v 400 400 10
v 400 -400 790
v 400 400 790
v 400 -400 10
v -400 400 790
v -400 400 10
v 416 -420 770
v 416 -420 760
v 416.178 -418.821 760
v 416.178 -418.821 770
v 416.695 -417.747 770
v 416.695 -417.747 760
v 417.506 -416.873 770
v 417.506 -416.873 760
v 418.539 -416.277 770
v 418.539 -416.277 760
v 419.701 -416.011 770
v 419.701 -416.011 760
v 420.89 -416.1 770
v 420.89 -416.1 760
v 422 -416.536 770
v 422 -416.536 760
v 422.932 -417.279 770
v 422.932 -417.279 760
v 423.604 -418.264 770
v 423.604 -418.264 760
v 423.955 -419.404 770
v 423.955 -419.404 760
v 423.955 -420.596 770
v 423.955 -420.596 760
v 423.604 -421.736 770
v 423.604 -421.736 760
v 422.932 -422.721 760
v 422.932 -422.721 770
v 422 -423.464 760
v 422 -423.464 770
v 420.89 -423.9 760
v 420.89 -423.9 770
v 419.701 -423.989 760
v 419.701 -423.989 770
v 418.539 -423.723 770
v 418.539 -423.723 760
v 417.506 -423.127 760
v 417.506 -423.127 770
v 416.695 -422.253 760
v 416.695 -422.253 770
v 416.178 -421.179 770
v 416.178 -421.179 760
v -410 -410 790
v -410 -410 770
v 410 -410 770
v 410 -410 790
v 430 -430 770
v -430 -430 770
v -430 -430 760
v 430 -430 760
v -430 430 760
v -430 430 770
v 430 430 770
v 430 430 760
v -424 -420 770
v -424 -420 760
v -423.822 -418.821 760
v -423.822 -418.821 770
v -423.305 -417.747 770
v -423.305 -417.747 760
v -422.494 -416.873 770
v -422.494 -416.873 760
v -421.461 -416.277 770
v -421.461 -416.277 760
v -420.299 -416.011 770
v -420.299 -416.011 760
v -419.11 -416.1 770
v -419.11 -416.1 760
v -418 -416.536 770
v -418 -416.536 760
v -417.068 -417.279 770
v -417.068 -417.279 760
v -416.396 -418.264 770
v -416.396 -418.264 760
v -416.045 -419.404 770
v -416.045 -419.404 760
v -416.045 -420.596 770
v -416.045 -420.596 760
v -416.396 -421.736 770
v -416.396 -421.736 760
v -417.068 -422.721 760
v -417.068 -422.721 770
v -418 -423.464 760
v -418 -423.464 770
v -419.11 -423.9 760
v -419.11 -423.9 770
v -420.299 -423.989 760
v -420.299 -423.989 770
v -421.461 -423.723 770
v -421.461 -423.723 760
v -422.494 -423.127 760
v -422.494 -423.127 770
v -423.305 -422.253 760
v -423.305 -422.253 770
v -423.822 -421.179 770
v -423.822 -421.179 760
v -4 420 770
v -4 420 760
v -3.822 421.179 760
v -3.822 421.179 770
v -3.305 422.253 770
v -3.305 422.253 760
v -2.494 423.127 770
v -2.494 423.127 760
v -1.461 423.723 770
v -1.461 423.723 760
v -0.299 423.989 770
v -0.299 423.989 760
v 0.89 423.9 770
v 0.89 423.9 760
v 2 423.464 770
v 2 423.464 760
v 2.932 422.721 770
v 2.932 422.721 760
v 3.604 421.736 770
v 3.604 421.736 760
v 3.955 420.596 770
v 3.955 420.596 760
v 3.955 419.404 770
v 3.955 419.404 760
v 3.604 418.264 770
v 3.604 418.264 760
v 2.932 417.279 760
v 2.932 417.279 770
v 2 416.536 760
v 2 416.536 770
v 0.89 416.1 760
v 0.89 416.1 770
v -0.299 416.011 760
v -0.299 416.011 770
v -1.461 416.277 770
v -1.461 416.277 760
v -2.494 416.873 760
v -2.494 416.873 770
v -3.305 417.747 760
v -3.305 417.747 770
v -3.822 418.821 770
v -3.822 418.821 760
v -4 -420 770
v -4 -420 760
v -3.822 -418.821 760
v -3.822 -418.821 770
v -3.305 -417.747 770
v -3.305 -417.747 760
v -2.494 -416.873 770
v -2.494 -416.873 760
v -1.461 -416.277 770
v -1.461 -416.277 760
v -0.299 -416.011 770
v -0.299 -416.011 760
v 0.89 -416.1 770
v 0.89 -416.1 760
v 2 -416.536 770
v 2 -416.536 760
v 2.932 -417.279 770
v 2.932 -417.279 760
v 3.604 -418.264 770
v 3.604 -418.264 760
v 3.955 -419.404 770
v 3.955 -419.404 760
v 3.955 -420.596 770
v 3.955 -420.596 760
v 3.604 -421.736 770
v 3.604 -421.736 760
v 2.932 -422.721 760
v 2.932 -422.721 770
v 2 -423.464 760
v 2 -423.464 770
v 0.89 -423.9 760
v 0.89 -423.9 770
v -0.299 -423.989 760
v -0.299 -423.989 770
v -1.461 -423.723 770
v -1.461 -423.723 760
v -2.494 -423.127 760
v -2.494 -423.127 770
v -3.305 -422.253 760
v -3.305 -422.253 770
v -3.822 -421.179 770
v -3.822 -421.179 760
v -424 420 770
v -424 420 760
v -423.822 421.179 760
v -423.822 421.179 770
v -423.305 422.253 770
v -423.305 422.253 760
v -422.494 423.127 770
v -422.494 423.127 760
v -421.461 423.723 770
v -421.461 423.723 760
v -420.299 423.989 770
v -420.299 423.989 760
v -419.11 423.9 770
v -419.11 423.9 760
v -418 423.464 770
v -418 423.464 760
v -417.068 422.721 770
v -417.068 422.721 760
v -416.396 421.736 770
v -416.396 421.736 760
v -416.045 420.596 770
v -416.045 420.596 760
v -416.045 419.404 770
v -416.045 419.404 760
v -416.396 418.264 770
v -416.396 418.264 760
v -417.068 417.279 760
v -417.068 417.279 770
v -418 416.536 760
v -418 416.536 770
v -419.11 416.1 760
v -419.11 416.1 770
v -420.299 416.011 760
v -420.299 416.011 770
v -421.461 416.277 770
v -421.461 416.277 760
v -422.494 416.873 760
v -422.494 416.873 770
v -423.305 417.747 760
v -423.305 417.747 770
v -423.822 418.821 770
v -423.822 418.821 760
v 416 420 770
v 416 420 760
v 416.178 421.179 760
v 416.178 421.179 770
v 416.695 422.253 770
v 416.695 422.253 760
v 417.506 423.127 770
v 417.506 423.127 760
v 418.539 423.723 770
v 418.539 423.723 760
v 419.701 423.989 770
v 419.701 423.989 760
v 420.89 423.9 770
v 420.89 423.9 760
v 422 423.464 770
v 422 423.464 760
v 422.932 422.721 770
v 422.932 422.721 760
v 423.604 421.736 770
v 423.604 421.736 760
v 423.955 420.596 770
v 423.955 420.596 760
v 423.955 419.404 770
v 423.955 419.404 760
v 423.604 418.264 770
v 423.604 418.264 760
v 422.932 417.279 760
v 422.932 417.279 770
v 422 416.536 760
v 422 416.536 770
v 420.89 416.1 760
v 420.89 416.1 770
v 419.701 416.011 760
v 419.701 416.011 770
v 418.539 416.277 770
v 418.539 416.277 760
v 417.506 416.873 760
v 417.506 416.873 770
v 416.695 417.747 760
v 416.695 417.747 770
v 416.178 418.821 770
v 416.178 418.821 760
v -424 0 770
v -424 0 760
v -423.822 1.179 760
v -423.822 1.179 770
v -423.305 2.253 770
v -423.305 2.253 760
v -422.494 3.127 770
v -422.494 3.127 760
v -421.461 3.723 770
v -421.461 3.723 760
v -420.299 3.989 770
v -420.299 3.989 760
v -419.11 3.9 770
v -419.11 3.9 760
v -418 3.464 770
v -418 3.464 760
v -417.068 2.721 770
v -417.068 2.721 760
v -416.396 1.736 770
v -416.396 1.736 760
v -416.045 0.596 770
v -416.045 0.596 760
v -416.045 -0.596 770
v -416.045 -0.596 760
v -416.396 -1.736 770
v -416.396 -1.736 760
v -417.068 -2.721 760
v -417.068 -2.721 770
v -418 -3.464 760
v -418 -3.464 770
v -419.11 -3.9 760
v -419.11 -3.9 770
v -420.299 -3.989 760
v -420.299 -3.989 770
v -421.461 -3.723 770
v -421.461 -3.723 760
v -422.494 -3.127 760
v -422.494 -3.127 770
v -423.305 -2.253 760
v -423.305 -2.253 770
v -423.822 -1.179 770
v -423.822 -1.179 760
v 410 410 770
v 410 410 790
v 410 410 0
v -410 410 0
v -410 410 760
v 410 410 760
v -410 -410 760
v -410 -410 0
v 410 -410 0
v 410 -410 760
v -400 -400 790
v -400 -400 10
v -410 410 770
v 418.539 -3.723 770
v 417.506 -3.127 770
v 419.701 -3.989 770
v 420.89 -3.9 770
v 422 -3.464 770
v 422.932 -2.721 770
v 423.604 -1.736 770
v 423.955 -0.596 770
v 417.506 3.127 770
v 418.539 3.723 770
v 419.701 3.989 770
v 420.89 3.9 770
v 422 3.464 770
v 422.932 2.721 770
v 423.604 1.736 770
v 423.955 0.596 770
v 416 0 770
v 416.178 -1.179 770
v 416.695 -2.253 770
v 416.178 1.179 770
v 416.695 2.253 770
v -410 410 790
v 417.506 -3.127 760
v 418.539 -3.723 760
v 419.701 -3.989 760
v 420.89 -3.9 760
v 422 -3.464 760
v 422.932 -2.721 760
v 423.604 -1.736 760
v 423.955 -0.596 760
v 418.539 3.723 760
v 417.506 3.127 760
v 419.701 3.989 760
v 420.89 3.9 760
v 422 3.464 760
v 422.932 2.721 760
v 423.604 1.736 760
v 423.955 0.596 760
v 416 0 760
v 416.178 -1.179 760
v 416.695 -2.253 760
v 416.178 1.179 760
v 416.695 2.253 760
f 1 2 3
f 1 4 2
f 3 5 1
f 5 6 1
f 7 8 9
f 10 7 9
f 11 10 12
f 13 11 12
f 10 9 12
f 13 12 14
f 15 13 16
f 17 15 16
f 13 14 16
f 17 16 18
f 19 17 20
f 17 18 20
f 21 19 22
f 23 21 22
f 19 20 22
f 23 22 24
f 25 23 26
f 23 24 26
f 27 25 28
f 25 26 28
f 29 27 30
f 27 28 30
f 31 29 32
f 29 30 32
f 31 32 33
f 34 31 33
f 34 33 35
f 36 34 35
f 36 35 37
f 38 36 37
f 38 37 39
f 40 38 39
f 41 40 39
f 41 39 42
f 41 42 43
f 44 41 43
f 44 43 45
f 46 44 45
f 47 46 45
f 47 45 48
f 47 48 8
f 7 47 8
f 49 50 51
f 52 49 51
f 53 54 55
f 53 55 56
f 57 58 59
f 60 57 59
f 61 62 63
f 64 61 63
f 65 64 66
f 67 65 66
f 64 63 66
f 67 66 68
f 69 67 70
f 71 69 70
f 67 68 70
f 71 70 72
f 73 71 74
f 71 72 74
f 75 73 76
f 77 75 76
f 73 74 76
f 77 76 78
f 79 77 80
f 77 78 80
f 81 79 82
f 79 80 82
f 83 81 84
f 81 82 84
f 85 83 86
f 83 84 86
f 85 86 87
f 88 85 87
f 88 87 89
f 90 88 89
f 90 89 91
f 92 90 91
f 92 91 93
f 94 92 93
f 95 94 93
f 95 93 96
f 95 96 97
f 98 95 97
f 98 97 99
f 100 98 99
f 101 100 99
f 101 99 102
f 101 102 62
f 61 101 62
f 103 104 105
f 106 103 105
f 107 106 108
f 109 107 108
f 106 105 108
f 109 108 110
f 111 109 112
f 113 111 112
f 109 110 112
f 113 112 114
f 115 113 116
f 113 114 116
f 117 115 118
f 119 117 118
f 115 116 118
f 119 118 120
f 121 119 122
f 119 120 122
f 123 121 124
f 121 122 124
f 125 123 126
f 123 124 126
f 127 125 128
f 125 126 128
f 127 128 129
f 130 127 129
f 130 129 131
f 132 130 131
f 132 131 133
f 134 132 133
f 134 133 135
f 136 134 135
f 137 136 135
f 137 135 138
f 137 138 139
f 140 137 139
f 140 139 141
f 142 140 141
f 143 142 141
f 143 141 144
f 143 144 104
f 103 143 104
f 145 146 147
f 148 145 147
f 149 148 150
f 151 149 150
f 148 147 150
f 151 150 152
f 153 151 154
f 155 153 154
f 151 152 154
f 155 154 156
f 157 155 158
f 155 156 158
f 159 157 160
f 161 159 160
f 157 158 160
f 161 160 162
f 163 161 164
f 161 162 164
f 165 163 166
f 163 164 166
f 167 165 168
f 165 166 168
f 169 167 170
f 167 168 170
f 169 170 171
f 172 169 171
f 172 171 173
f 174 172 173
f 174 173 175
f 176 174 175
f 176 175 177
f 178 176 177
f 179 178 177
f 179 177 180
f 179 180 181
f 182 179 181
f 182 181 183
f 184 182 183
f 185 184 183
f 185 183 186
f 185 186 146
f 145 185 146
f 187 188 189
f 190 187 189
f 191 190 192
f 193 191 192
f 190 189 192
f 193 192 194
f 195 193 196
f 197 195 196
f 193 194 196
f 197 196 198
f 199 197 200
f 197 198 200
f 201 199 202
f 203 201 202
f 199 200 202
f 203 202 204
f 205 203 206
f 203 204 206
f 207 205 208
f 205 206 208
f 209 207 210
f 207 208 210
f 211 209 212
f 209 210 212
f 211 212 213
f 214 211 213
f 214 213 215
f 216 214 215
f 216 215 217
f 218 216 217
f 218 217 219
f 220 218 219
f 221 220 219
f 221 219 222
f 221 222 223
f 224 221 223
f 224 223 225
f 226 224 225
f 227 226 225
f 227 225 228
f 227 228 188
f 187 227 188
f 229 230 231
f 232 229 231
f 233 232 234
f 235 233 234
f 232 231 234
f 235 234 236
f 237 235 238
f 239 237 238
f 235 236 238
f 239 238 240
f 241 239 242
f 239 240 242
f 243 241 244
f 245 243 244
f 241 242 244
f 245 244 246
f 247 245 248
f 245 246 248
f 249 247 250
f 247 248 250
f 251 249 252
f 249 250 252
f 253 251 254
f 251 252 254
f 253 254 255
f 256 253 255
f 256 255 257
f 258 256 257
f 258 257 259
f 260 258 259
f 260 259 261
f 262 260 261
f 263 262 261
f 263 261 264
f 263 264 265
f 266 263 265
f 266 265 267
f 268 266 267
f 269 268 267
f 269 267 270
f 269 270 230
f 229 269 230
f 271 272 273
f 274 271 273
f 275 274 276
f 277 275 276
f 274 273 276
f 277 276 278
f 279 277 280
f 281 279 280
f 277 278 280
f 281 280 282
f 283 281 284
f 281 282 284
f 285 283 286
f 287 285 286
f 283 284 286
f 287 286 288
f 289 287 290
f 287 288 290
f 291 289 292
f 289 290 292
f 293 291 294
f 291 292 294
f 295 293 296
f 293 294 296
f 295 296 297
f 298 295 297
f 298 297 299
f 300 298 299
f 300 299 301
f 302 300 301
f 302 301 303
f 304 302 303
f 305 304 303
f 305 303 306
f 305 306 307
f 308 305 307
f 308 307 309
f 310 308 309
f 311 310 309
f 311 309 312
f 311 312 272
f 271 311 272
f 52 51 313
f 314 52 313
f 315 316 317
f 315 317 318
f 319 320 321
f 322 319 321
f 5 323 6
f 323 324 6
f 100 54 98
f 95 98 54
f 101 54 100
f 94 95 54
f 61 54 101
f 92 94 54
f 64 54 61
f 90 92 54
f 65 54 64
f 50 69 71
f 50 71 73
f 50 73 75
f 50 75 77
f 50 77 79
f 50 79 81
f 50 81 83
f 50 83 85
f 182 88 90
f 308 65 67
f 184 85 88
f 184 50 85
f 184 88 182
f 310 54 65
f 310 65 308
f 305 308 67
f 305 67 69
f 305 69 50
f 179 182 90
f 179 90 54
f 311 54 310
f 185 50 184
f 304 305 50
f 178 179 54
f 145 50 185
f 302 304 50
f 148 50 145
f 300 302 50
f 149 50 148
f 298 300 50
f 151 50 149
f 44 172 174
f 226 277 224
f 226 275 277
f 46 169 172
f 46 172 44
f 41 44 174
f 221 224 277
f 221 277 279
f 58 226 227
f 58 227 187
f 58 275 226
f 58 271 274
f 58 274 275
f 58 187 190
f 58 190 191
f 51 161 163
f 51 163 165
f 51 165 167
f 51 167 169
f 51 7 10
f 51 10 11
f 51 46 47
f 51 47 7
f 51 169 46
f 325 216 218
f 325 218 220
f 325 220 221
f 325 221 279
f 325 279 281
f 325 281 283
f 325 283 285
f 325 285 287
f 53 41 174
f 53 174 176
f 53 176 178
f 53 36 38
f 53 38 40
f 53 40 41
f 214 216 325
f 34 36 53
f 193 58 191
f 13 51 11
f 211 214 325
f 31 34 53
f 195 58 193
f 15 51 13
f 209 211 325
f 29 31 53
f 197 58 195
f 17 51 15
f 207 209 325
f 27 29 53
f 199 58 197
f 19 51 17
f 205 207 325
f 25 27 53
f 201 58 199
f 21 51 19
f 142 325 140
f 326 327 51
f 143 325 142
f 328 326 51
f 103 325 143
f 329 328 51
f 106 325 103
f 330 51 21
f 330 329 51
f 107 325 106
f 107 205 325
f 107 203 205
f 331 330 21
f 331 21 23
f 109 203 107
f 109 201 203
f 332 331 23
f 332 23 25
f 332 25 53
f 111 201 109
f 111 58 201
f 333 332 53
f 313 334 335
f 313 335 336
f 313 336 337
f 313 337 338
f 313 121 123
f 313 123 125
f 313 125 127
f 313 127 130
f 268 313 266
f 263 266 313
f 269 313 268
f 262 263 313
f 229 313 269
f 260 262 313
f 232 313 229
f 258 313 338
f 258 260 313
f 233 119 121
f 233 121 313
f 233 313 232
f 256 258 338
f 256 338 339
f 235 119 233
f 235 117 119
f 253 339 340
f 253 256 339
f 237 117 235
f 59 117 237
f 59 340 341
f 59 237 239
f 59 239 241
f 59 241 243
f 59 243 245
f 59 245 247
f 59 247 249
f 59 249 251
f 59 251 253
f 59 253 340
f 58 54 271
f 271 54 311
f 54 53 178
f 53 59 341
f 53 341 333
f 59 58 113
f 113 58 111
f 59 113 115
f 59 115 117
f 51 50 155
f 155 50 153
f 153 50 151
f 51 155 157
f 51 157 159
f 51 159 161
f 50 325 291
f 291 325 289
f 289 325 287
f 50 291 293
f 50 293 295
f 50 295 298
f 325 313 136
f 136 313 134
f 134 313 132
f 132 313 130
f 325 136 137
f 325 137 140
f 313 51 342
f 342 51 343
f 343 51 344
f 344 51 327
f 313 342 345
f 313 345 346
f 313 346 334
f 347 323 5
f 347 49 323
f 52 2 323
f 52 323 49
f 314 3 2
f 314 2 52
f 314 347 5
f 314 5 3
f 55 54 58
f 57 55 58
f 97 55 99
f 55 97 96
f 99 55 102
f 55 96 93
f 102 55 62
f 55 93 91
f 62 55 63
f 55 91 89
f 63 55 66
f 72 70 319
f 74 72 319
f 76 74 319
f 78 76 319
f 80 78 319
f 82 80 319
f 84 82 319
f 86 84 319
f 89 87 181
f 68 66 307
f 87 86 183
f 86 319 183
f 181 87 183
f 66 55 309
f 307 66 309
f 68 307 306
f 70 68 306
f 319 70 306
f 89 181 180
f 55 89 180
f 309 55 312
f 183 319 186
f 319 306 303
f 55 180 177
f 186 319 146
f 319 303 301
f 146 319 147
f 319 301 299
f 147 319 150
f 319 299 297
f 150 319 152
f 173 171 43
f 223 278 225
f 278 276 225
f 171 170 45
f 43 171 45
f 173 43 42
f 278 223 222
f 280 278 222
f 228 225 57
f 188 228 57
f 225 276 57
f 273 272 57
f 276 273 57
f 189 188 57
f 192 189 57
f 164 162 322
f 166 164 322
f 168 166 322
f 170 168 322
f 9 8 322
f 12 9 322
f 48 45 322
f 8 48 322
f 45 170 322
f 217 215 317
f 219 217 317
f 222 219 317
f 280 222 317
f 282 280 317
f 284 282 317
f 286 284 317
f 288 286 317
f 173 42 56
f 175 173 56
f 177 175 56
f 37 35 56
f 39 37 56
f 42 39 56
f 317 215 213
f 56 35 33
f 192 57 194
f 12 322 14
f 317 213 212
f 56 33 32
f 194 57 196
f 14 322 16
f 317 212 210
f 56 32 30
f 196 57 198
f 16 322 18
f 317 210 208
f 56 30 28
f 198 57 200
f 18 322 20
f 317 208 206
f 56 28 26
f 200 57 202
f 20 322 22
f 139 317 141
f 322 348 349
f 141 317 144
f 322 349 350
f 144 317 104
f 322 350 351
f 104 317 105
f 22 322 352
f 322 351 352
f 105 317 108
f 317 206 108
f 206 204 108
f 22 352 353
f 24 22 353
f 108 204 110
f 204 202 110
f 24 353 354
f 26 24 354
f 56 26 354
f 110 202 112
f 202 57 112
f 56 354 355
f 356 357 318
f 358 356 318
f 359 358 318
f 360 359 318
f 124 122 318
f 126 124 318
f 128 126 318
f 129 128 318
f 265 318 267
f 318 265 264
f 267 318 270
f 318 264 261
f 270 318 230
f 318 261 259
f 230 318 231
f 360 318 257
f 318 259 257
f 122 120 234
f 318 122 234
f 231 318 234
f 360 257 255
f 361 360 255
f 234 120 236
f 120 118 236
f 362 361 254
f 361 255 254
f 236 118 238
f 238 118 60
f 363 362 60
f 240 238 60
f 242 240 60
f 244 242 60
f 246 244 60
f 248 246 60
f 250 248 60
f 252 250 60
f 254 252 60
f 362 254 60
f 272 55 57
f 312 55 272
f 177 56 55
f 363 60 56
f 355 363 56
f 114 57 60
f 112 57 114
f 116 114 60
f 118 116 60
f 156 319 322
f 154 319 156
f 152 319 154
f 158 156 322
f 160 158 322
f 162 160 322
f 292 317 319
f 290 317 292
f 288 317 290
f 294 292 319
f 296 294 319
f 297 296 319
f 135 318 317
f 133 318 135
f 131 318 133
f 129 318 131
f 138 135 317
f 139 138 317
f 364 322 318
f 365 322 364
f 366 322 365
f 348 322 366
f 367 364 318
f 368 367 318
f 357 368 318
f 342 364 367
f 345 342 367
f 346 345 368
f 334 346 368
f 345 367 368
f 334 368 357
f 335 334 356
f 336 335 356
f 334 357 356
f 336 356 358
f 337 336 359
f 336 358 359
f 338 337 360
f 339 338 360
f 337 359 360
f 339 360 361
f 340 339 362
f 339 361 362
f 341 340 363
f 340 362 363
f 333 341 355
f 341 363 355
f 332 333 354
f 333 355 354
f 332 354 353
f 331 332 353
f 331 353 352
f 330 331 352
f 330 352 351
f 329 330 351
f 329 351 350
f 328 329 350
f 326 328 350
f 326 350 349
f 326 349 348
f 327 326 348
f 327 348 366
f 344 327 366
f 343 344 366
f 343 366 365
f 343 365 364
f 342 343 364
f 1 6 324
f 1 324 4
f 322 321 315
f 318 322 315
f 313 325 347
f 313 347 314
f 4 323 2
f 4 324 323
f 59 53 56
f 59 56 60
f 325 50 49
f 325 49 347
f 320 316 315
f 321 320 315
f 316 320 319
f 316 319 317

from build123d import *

# Parameters (mm, degrees)
F0_W     = 820
F0_H     = 820
F1_DEPTH = 790
F2_T     = -10
F4_W     = 860
F4_H     = 860
F4_W_2   = 820
F4_H_2   = 820
F5_DEPTH = 10
F7_D     = 8


with BuildPart() as f1:
    # F0 (on Top) → F1 (new body)
    with BuildSketch(Plane.XY):
        Rectangle(F0_W, F0_H)
    extrude(amount=F1_DEPTH)

    # F2
    f2_openings = [f1.faces().sort_by_distance(p)[0] for p in [
        (0, 0, 790),
    ]]
    offset(amount=F2_T, openings=f2_openings)

    # F4 (on offset) → F5 (join)
    with BuildSketch(Plane.XY.offset(770)):
        Rectangle(F4_W, F4_H)
        Rectangle(F4_W_2, F4_H_2, mode=Mode.SUBTRACT)
    extrude(amount=-F5_DEPTH)

    # F7 (through all)
    with Locations(Plane.XY.offset(770)):
        with Locations((0, 420), (-420, 420), (-420, 0), (-420, -420), (0, -420), (420, 0), (420, -420), (420, 420)):
            Hole(F7_D / 2)


solid = f1.part
